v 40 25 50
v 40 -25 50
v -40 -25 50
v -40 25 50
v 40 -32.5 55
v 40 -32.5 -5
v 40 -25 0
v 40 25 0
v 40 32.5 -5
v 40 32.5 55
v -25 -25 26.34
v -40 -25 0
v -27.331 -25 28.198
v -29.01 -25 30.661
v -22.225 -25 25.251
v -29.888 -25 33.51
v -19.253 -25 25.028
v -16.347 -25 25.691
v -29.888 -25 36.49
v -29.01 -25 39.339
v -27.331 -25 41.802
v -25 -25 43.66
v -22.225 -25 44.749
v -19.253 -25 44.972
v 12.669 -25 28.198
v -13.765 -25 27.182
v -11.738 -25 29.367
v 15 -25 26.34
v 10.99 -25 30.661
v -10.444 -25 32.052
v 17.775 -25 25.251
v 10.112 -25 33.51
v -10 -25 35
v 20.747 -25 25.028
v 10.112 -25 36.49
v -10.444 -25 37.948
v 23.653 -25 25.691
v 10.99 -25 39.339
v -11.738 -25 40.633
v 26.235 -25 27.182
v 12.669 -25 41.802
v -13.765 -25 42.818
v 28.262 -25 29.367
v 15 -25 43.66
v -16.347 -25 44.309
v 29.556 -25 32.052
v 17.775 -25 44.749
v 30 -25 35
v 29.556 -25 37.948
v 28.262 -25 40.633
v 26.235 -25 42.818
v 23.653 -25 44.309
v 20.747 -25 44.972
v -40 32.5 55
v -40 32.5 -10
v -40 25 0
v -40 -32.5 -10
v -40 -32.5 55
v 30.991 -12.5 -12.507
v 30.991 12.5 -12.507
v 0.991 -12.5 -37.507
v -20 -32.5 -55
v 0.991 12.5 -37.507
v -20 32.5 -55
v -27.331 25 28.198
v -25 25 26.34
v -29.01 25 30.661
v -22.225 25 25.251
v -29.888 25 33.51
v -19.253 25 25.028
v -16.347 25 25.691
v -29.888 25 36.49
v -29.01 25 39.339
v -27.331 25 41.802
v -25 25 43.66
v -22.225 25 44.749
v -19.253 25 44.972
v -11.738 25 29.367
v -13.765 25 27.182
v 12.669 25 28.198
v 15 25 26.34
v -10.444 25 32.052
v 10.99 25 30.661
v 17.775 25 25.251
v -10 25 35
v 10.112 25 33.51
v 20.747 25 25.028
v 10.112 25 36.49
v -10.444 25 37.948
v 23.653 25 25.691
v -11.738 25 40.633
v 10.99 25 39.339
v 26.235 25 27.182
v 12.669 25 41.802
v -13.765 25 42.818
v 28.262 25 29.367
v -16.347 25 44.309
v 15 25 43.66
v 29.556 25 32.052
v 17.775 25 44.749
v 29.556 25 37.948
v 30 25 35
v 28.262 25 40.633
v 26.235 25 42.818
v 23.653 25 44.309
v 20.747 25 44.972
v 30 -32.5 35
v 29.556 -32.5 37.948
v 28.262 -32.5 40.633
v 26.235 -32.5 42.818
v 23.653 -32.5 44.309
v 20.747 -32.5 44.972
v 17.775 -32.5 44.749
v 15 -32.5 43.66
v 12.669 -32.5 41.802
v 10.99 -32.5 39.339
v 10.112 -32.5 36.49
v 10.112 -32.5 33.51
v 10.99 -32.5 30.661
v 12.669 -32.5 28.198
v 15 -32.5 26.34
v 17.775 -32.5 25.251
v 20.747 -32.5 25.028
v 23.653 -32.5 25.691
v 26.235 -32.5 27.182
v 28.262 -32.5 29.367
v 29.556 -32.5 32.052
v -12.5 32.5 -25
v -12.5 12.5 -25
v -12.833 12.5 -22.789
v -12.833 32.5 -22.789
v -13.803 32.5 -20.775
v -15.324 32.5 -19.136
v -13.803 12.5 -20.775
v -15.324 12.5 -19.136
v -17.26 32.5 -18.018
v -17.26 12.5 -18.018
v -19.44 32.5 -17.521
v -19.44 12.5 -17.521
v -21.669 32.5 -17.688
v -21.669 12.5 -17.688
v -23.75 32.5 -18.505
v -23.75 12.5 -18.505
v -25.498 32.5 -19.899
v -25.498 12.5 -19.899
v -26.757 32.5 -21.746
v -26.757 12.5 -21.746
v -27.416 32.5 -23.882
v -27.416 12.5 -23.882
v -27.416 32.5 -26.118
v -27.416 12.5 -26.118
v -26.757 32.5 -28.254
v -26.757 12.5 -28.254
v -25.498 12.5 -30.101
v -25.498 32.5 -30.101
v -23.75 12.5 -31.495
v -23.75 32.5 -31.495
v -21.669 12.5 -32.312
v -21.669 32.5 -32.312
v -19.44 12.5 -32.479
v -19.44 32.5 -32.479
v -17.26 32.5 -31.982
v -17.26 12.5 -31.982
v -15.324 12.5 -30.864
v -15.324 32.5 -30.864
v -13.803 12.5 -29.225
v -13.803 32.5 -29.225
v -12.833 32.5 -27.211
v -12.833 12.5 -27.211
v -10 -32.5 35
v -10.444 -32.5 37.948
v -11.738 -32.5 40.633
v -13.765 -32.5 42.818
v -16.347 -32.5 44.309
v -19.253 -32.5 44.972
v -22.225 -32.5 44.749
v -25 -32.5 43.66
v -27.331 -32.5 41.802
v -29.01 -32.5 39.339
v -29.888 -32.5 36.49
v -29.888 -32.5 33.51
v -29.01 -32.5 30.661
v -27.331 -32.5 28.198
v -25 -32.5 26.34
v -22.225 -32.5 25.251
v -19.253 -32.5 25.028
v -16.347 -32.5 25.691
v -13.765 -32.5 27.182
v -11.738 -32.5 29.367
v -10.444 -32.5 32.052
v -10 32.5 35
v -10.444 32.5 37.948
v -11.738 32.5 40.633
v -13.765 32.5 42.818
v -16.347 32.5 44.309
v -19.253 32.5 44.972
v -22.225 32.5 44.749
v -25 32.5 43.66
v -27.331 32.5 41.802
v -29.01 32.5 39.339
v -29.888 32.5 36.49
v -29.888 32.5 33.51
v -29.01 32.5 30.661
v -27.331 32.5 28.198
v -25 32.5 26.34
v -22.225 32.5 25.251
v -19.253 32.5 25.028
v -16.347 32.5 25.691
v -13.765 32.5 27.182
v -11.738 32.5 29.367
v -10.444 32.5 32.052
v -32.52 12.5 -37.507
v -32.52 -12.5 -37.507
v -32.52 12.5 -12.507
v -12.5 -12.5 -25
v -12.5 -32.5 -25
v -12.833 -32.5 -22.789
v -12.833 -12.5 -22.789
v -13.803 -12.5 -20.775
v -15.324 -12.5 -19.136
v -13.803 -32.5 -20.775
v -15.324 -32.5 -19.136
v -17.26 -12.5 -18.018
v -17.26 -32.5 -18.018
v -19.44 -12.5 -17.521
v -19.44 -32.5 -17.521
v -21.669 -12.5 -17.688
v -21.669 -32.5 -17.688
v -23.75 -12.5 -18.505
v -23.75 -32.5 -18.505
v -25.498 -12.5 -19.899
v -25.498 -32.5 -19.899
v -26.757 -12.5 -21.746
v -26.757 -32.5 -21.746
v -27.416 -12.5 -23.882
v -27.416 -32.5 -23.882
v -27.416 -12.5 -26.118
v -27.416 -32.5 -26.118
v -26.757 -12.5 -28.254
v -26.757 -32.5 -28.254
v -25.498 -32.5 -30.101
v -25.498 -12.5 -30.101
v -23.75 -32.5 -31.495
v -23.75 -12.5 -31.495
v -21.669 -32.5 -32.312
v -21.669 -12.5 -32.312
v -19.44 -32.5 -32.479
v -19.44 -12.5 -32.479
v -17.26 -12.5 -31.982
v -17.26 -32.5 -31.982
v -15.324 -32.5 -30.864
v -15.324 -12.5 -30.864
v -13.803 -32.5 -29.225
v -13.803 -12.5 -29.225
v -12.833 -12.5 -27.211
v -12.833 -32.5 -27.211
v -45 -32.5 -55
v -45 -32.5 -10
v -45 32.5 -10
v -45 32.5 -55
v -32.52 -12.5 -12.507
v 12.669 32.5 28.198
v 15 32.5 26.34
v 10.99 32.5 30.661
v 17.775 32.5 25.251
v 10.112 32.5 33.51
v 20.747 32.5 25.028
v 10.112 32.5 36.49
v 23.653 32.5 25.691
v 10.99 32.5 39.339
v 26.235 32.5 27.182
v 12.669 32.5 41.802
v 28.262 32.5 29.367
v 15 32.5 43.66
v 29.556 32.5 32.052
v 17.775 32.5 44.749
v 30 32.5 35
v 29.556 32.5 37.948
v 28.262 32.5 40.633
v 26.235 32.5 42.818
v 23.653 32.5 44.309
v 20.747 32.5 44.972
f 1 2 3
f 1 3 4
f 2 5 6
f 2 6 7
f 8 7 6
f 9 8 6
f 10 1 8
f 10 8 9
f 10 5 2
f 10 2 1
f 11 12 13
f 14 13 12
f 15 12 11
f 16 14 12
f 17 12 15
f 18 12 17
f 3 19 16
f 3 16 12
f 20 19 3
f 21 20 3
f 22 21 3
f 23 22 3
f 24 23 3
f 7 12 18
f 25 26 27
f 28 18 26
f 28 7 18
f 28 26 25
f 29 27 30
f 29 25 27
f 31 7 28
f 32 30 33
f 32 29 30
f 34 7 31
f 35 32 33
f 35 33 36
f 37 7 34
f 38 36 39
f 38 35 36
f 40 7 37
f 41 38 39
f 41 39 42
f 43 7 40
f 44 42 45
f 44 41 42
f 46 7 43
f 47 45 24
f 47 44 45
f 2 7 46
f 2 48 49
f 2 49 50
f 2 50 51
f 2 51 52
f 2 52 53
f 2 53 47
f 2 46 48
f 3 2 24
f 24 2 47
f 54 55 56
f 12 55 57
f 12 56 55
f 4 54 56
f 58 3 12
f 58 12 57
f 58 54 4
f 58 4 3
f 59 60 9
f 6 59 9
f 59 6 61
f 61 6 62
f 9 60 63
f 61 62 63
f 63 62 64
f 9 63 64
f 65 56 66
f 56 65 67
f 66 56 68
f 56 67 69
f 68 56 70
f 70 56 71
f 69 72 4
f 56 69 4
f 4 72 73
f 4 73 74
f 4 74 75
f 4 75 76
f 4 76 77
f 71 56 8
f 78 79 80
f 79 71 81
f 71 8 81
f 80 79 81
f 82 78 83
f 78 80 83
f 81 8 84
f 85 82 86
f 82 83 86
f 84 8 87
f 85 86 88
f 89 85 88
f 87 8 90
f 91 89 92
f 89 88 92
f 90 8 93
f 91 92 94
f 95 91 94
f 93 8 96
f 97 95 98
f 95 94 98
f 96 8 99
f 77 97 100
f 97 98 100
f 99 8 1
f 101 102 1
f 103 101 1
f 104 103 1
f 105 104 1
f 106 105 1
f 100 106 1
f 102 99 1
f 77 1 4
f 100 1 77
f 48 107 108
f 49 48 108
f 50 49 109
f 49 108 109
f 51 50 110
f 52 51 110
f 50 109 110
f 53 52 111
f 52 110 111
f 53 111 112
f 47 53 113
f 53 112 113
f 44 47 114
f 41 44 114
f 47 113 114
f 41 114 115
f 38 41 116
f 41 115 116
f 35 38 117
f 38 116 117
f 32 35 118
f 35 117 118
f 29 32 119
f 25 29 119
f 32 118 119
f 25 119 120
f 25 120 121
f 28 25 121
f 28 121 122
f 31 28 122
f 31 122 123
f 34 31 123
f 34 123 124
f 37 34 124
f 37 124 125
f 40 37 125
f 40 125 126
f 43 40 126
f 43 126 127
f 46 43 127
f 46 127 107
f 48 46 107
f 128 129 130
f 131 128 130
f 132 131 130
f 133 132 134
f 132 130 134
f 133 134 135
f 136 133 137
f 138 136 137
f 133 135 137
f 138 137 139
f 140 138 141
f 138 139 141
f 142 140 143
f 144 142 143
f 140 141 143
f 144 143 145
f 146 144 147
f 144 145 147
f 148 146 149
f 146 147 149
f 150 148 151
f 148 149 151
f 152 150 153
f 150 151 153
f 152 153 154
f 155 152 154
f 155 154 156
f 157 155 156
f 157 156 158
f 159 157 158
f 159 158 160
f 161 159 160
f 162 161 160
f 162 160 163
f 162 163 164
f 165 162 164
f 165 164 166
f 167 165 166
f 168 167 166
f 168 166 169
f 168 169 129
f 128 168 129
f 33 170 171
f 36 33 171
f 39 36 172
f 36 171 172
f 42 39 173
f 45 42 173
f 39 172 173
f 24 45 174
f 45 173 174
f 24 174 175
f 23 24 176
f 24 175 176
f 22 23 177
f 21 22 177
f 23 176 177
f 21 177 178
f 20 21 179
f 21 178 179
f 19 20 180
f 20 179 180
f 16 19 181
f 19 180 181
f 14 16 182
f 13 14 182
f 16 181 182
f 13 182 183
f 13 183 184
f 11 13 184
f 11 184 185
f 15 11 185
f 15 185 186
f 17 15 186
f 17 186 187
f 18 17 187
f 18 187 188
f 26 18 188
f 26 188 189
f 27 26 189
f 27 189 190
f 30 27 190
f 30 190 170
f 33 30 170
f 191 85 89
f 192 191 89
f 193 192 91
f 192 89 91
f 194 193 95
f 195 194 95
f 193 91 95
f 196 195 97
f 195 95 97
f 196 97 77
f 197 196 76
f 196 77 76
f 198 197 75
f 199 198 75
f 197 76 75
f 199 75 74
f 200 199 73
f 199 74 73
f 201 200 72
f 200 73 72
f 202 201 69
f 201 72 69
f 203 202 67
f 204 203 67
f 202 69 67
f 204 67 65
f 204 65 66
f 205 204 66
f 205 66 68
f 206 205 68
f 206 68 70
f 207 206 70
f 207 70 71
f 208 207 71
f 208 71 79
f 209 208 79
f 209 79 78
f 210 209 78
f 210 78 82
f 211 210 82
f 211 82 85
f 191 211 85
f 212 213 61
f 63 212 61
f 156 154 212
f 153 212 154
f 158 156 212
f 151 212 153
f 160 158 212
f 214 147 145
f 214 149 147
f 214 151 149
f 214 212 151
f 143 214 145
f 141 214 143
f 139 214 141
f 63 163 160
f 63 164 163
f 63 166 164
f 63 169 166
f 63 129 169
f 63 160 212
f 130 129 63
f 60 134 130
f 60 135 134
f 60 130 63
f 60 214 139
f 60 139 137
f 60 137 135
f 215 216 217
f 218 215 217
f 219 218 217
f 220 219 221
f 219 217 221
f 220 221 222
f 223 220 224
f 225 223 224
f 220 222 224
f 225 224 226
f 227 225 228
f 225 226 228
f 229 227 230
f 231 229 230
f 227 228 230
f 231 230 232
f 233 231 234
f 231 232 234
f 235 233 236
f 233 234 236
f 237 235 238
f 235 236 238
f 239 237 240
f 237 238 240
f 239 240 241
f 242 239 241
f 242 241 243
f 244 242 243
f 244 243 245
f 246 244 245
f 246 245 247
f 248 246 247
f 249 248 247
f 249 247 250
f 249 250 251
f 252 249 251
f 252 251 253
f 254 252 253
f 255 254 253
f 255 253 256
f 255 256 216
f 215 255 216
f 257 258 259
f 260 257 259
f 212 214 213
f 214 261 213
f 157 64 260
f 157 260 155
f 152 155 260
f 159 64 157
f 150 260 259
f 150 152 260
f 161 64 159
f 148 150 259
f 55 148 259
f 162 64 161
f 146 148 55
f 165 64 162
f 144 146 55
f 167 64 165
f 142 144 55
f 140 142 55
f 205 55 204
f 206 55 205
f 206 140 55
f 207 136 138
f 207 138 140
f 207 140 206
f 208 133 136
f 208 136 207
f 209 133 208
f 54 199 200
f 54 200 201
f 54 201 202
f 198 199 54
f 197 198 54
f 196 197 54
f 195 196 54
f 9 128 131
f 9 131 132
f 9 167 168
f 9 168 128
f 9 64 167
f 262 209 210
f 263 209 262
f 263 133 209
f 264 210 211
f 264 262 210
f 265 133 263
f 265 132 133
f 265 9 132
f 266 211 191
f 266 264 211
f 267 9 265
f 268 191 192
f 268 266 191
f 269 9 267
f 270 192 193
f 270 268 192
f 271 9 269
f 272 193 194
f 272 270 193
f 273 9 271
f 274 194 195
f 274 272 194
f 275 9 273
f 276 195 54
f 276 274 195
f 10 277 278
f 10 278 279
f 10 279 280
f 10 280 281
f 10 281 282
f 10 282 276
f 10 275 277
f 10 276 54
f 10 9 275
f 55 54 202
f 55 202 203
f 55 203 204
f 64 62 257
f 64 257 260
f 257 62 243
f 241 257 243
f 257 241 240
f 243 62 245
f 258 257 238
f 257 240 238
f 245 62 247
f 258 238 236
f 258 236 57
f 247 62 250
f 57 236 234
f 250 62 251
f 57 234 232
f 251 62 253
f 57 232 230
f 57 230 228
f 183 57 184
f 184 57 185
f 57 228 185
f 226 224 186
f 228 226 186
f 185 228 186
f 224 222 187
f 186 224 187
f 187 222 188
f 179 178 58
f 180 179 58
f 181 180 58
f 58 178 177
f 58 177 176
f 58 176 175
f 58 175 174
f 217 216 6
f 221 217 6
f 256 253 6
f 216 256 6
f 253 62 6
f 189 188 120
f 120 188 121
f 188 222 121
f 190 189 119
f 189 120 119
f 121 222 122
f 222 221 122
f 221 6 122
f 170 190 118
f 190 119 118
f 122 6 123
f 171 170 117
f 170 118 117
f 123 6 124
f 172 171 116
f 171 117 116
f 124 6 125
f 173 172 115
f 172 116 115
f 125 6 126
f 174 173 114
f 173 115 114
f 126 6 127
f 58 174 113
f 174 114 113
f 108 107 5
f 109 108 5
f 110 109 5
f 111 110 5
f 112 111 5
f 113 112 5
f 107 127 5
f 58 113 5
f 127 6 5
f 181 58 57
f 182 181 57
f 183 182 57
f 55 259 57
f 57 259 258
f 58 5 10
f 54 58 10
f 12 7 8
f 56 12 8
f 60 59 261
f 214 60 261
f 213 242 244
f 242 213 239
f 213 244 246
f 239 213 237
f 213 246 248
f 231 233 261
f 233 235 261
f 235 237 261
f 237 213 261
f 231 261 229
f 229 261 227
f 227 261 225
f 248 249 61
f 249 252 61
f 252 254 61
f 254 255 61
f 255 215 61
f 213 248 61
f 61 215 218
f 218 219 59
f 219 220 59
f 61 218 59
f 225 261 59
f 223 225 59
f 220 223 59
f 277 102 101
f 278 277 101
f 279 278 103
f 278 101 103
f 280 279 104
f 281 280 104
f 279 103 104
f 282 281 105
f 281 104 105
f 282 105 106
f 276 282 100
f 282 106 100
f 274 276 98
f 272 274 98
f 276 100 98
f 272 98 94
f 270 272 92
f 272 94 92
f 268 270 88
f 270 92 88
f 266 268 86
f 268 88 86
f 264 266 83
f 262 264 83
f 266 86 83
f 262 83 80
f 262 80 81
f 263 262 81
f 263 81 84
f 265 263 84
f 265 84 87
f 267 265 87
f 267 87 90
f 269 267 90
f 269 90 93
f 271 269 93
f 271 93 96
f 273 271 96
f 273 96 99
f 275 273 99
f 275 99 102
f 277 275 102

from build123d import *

# Parameters (mm, degrees)
F0_W      = 65
F0_H      = 110
F1_DEPTH  = 40
F2_SIZE2  = 60
F2_SIZE   = 50
F3_R      = 10
F3_R_2    = 7.5
F4_DEPTH  = 65
F5_W      = 50
F5_H      = 50
F6_DEPTH  = 80
F7_DEPTH  = 5
F8_W      = 65
F8_H      = 65
F8_W_2    = 50
F8_H_2    = 50
F9_DEPTH  = 5
F11_DEPTH = 12.5


with BuildPart() as f1:
    # F0 (on Right) → F1 (new body, symmetric)
    with BuildSketch(Plane.YZ):
        Rectangle(F0_W, F0_H)
    extrude(amount=F1_DEPTH, both=True)

    # F2
    f2_edges = [f1.edges().sort_by_distance(p)[0] for p in [
        (40, 0, -55),
    ]]
    f2_side = f1.faces().sort_by_distance((40, 0, 0))[0]
    chamfer(f2_edges, length=F2_SIZE, length2=F2_SIZE2, reference=f2_side)

    # F3 (on face) → F4 (cut, through all)
    with BuildSketch(Plane.XZ.offset(32.5)):
        with Locations((-20, 35)):
            Circle(F3_R)
        with Locations((20, 35)):
            Circle(F3_R)
        with Locations((-20, -25)):
            Circle(F3_R_2)
    extrude(amount=-F4_DEPTH, mode=Mode.SUBTRACT)

    # F5 (on face) → F6 (cut, through all)
    with BuildSketch(Plane.YZ.offset(40)):
        with Locations((0, 25)):
            Rectangle(F5_W, F5_H)
    extrude(amount=-F6_DEPTH, mode=Mode.SUBTRACT)

    # F7 (add): a face of the model
    f7_faces = [f1.faces().sort_by_distance(p)[0] for p in [
        (-40, 0, -13.4408602151),
    ]]
    extrude(f7_faces, amount=F7_DEPTH)

    # F8 (on face) → F9 (cut)
    with BuildSketch(Plane(origin=(-45, 0, 0), x_dir=(0, -1, 0), z_dir=(-1, 0, 0))):
        with Locations((0, 22.5)):
            Rectangle(F8_W, F8_H)
        with Locations((0, 25)):
            Rectangle(F8_W_2, F8_H_2, mode=Mode.SUBTRACT)
    extrude(amount=-F9_DEPTH, mode=Mode.SUBTRACT)

    # F10 (on Front) → F11 (cut, symmetric)
    with BuildSketch(Plane.XZ):
        Polygon((-32.5196777628, -12.5074763466), (-32.5196777628, -24.9999955257), (-32.5196777628, -37.5074763466), (33.280384575, -37.5074763466), (33.280384575, -12.5074763466), align=None)
    extrude(amount=F11_DEPTH, both=True, mode=Mode.SUBTRACT)


solid = f1.part
